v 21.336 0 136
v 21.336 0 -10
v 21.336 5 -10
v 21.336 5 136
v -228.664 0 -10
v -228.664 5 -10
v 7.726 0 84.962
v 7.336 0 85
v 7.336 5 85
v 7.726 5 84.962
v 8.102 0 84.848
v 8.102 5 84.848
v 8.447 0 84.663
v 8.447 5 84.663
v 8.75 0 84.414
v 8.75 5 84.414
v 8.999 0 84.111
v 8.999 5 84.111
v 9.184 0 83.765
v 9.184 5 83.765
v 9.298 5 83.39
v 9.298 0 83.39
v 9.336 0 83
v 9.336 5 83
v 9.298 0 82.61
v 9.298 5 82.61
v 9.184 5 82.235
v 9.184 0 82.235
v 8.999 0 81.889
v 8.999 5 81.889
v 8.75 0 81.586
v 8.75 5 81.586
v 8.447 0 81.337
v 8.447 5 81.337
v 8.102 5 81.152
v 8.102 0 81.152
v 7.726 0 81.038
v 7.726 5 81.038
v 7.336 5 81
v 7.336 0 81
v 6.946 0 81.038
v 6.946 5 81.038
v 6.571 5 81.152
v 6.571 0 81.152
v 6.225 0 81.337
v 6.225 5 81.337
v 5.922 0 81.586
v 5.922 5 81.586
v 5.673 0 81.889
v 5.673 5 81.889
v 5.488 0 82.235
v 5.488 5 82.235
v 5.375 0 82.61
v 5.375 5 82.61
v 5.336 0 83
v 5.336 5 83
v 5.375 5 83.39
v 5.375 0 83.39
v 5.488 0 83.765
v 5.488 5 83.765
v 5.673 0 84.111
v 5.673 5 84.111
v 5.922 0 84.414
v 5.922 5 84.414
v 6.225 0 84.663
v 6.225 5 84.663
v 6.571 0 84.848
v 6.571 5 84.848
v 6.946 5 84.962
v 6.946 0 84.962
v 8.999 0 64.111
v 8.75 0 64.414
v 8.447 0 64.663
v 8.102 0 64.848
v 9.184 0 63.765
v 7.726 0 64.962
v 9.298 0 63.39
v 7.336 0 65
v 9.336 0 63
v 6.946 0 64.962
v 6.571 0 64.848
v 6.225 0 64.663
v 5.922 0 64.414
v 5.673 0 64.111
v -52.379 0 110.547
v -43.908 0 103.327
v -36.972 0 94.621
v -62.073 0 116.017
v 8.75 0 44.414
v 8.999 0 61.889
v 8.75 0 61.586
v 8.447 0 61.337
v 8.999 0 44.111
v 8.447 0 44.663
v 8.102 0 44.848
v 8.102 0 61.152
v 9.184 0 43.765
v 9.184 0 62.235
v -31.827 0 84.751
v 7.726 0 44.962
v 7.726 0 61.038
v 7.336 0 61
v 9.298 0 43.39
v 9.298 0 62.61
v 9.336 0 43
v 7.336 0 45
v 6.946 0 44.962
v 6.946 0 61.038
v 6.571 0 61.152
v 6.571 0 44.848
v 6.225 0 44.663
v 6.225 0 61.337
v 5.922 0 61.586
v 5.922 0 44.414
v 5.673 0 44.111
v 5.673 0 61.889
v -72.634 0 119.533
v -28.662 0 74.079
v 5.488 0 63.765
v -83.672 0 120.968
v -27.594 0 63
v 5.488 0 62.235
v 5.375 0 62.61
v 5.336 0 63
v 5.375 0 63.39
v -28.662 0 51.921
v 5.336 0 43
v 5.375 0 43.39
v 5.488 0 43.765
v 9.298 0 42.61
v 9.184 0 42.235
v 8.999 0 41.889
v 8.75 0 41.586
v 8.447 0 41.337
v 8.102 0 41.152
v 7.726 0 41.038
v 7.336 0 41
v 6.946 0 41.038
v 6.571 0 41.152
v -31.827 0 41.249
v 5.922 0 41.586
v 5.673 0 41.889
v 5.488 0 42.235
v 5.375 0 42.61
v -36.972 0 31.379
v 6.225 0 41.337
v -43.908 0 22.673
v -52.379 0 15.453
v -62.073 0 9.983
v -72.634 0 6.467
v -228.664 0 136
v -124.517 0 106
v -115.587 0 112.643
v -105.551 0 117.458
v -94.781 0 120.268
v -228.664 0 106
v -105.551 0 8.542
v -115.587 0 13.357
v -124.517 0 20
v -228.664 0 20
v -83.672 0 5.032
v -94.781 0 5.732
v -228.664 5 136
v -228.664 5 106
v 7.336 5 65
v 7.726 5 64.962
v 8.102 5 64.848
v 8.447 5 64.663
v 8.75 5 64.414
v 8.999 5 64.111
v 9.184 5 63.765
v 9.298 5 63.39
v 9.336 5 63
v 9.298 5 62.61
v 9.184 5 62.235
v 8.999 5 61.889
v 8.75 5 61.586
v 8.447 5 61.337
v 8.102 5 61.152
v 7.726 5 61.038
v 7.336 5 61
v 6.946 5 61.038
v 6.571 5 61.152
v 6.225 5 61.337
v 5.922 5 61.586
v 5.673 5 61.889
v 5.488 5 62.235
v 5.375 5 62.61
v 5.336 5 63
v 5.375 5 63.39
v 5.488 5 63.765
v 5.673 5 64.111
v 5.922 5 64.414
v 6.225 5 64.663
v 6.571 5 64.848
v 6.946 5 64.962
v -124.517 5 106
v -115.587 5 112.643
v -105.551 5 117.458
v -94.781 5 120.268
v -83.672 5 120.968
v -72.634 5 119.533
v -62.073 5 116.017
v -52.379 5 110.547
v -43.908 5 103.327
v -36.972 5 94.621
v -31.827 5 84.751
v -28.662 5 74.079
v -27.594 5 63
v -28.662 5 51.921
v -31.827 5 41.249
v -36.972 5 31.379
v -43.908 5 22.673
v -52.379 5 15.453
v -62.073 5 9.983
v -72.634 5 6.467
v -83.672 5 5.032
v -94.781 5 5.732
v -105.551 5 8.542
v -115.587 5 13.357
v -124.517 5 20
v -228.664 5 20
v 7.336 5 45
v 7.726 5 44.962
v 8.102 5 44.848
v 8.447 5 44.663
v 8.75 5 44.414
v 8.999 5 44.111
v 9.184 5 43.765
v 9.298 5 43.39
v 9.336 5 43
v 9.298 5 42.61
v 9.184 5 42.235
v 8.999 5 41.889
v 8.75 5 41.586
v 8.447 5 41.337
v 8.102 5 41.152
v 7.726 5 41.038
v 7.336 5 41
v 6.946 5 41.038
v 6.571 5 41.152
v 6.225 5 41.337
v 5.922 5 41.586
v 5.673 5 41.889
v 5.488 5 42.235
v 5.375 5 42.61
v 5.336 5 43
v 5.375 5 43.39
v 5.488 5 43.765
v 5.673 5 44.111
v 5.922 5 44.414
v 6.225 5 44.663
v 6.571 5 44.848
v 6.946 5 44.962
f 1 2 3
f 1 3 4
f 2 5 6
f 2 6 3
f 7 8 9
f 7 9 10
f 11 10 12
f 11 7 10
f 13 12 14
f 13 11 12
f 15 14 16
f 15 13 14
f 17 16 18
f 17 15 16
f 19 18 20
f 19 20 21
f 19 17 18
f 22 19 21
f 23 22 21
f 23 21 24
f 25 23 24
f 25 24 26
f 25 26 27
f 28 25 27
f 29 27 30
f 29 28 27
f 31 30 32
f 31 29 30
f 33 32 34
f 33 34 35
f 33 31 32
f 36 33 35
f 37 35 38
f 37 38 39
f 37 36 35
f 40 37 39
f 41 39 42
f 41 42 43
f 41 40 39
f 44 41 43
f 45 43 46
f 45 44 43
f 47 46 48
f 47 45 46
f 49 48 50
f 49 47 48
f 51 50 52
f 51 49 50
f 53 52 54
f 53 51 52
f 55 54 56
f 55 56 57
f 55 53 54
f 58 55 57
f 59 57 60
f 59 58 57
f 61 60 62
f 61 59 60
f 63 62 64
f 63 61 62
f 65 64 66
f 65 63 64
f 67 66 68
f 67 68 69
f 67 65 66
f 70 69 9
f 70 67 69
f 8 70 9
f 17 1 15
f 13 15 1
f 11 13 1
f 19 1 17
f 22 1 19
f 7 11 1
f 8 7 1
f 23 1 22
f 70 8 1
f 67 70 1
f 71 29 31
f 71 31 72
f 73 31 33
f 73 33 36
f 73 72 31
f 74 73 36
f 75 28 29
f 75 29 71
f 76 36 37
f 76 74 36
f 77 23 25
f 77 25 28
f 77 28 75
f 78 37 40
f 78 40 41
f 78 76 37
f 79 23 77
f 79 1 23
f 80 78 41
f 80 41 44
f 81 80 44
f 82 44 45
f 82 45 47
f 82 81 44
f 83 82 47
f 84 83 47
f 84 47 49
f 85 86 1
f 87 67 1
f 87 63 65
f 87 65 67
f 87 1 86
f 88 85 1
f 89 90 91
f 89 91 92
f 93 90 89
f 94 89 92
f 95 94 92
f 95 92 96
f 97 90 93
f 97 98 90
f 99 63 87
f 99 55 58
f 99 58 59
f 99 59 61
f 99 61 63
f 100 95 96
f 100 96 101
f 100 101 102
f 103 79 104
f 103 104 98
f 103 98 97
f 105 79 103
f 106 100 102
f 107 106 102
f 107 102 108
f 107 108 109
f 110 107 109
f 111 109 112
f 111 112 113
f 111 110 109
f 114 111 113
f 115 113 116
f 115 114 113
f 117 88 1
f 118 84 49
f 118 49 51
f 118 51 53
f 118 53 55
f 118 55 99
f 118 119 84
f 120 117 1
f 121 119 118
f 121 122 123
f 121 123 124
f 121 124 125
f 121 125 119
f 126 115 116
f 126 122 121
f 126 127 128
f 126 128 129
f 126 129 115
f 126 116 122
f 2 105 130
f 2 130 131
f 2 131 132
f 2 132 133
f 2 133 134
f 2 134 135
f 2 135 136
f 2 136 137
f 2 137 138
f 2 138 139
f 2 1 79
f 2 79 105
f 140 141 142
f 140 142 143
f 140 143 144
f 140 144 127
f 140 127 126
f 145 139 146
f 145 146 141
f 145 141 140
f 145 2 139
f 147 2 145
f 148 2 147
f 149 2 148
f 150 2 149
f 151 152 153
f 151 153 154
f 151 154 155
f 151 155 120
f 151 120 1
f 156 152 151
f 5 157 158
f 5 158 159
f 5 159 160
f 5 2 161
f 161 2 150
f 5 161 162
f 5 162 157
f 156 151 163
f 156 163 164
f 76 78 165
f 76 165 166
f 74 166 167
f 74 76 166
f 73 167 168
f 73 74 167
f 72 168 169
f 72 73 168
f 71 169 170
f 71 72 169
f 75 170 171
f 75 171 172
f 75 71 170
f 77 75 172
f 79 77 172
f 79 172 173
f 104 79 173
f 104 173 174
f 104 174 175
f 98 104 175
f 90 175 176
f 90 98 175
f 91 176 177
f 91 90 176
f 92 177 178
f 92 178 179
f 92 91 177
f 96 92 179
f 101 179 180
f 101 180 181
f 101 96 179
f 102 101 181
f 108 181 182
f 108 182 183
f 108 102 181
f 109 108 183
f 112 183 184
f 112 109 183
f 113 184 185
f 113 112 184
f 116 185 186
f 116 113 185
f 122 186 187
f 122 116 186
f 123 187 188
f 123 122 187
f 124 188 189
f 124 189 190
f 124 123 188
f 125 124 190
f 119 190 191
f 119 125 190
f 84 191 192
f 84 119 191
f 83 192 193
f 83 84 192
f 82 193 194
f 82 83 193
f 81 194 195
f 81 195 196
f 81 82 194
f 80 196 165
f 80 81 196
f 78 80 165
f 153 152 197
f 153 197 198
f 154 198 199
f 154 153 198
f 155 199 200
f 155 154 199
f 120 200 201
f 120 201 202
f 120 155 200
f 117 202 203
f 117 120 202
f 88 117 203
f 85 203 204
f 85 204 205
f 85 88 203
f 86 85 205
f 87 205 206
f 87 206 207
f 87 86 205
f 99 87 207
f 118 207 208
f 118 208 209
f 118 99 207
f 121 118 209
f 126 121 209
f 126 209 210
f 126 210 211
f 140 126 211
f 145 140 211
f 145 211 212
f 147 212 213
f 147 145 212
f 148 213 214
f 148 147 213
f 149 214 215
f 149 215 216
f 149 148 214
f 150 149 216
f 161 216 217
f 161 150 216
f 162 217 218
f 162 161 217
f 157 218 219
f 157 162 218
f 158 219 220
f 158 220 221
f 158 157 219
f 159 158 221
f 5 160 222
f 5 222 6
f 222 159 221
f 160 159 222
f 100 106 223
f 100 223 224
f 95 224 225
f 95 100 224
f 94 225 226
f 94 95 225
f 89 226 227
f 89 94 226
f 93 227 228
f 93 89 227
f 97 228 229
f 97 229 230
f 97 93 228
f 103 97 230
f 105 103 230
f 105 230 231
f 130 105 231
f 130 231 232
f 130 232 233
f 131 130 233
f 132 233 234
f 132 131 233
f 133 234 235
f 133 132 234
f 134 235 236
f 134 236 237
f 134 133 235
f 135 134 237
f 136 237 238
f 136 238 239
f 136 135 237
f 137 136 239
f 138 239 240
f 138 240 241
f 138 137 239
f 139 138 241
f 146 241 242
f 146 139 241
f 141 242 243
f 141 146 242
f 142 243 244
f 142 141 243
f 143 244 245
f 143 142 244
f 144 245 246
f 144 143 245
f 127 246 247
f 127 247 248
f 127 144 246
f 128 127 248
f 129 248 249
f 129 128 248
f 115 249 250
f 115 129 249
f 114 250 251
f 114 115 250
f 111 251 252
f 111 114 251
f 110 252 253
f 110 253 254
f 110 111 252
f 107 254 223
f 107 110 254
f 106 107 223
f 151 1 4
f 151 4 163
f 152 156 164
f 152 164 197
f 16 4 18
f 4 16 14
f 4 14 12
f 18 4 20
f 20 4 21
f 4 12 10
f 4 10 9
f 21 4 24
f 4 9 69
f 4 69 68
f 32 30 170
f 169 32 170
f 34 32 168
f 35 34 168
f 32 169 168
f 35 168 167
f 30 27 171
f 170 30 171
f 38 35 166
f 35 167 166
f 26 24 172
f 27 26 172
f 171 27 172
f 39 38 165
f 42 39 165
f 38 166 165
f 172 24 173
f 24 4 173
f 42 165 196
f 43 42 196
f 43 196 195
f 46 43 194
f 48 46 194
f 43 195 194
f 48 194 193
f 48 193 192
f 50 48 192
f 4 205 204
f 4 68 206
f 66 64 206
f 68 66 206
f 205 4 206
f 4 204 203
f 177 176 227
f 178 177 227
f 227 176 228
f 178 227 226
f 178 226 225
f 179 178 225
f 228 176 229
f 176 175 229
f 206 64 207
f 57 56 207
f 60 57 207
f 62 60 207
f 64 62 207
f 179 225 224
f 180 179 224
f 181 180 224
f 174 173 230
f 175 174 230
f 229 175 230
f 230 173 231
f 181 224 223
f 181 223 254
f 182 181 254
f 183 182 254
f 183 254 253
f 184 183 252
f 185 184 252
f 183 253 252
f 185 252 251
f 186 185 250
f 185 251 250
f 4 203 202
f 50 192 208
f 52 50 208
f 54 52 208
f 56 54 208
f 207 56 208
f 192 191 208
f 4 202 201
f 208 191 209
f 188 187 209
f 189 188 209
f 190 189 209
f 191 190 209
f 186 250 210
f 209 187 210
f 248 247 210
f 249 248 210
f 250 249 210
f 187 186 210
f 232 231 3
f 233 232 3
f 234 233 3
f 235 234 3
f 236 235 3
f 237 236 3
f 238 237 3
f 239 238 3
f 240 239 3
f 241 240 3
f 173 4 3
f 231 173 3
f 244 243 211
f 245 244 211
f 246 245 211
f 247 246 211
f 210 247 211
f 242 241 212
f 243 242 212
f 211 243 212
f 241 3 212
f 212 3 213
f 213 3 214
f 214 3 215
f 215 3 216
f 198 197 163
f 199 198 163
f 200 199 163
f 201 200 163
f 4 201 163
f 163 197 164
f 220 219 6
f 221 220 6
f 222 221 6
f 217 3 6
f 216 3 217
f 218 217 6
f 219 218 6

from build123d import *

# Parameters (mm, degrees)
SKETCH1_R           = 2
BOSS_EXTRUDE1_DEPTH = 5


with BuildPart() as part:
    # Sketch1 → Boss-Extrude1 (new body)
    with BuildSketch(Plane(origin=(0, 0, 0), x_dir=(1, 0, 0), z_dir=(0, 1, 0))):
        with BuildLine():
            Line((-228.663769869, 10), (-118.663769869, 10))
            Line((-118.663769869, 10), (21.336230131, 10))
            Line((21.336230131, 10), (21.336230131, -106))
            Line((21.336230131, -106), (21.336230131, -136))
            Line((21.336230131, -136), (-118.663769869, -136))
            Line((-118.663769869, -136), (-228.663769869, -136))
            Line((-228.663769869, -136), (-228.663769869, -106))
            Line((-228.663769869, -106), (-124.517389937, -106))
            ThreePointArc((-124.517389937, -106), (-27.594389025, -63), (-124.517389937, -20))
            Line((-124.517389937, -20), (-228.663769869, -20))
            Line((-228.663769869, -20), (-228.663769869, 10))
        make_face()
        with Locations(Location((7.336230131, -63, 0), (0, 0, 270))):
            Circle(SKETCH1_R, mode=Mode.SUBTRACT)
        with Locations(Location((7.336230131, -43, 0), (0, 0, 270))):
            Circle(SKETCH1_R, mode=Mode.SUBTRACT)
        with Locations(Location((7.336230131, -83, 0), (0, 0, 270))):
            Circle(SKETCH1_R, mode=Mode.SUBTRACT)
    extrude(amount=BOSS_EXTRUDE1_DEPTH)


solid = part.part
